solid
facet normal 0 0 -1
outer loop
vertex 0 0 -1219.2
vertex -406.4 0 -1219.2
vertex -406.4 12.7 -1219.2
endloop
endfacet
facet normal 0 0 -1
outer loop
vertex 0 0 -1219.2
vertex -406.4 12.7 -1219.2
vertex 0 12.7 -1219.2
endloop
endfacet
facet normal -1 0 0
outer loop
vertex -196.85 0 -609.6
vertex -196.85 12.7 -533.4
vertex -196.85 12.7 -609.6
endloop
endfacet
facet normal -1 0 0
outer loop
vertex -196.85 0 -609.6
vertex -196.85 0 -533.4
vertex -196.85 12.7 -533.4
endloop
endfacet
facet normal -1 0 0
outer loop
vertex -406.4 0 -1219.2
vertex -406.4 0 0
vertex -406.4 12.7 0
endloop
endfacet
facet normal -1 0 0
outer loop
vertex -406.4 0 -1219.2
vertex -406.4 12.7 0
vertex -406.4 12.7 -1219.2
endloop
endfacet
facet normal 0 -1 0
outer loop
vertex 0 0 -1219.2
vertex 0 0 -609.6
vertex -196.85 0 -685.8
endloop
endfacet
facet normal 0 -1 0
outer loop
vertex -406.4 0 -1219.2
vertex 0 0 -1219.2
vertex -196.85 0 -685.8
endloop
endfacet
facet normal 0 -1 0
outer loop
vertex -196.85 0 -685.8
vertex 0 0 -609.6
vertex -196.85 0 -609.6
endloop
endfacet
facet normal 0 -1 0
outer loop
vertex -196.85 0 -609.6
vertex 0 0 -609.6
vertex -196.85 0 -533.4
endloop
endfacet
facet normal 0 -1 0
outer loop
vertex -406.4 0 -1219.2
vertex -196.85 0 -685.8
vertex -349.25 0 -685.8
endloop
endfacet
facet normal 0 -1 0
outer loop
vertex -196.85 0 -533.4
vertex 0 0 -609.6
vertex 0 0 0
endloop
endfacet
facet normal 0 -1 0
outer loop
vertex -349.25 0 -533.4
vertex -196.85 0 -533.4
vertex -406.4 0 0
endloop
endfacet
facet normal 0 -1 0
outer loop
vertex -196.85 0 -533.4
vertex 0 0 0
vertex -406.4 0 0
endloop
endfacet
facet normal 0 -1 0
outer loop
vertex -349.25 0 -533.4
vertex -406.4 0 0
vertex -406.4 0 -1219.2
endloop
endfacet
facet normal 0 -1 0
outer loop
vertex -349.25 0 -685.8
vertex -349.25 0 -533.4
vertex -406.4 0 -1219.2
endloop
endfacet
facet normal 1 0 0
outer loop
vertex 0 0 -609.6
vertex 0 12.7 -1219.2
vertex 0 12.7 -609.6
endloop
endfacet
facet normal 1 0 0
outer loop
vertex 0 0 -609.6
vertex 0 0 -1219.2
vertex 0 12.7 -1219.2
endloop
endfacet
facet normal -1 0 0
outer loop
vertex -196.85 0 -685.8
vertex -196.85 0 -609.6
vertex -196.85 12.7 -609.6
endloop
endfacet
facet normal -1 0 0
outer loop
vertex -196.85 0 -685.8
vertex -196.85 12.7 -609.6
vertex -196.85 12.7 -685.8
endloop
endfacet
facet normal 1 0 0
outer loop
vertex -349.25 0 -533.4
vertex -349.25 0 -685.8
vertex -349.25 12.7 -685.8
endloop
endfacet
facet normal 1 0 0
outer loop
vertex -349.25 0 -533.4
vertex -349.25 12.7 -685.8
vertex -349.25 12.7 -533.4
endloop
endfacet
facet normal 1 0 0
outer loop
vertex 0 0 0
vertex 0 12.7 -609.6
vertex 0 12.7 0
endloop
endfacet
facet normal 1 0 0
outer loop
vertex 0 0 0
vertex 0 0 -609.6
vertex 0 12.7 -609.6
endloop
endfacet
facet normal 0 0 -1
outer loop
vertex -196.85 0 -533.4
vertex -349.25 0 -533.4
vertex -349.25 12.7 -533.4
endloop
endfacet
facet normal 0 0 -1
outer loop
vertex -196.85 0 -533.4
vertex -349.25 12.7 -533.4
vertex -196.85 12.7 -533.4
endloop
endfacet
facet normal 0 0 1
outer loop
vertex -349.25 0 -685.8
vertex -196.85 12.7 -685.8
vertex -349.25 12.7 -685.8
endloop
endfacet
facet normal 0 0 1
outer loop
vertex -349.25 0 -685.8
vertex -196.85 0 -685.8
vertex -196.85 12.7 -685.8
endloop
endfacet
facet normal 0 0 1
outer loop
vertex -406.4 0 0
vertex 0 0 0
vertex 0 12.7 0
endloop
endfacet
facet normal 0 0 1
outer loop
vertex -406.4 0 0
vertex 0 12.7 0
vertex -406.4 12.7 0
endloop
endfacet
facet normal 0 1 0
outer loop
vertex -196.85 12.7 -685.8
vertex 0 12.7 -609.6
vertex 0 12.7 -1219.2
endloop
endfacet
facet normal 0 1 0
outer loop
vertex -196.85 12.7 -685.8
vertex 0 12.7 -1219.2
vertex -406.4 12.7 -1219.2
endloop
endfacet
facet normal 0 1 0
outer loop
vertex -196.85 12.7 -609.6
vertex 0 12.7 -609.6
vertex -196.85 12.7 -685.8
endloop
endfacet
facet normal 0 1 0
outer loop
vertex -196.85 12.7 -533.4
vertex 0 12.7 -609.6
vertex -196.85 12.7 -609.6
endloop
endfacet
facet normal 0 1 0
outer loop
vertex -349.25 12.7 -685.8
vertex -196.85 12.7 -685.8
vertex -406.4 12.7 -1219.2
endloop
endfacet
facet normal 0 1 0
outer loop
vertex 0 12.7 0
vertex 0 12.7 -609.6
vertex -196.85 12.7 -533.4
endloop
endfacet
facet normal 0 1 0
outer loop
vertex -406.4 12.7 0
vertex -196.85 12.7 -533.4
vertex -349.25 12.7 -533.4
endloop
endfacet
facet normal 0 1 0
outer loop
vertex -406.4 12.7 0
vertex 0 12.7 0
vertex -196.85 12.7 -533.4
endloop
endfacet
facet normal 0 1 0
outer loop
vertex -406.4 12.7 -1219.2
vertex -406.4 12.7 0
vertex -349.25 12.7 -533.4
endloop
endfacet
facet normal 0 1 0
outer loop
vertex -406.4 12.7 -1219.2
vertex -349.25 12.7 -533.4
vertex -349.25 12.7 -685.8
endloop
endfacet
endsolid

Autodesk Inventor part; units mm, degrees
ref_plane "YZ Plane" through (0, 0, 0) normal (1, 0, 0) x (0, 1, 0)
ref_plane "XZ Plane" through (0, 0, 0) normal (0, 1, 0) x (-1, 0, 0)
ref_plane "XY Plane" through (0, 0, 0) normal (0, 0, 1) x (1, 0, 0)
sketch "Sketch1" plane through (0, 0, 0) normal (0, 1, 0) x (-1, 0, 0)
  line L0 (0, 0) -> (406.4, 0)
  line L1 (406.4, 0) -> (406.4, -1219.2)
  line L2 (406.4, -1219.2) -> (0, -1219.2)
  line L3 (0, -1219.2) -> (0, 0)
  line L4 (0, -609.6) -> (101.6, -609.6)
  line L5 (101.6, -609.6) -> (184.15, -609.6)
  line L6 (184.15, -609.6) -> (273.05, -609.6)
  line L7 (349.25, -533.4) -> (196.85, -533.4)
  line L8 (196.85, -533.4) -> (196.85, -685.8)
  line L9 (196.85, -685.8) -> (349.25, -685.8)
  line L10 (349.25, -685.8) -> (349.25, -533.4)
  line L11 (349.25, -533.4) -> (196.85, -685.8) construction
  line L12 (196.85, -533.4) -> (349.25, -685.8) construction
  dimension "d0" = 1219.2
  dimension "d1" = 406.4
  dimension "d2" = 101.6
  dimension "d3" = 82.55
  dimension "d4" = 88.9
  dimension "d5" = 152.4
  dimension "d6" = 152.4
extrude "Extrusion1" add sketch "Sketch1" along normal blind 12.7
properties part number "backBoard" material "Wood (Birch)"
